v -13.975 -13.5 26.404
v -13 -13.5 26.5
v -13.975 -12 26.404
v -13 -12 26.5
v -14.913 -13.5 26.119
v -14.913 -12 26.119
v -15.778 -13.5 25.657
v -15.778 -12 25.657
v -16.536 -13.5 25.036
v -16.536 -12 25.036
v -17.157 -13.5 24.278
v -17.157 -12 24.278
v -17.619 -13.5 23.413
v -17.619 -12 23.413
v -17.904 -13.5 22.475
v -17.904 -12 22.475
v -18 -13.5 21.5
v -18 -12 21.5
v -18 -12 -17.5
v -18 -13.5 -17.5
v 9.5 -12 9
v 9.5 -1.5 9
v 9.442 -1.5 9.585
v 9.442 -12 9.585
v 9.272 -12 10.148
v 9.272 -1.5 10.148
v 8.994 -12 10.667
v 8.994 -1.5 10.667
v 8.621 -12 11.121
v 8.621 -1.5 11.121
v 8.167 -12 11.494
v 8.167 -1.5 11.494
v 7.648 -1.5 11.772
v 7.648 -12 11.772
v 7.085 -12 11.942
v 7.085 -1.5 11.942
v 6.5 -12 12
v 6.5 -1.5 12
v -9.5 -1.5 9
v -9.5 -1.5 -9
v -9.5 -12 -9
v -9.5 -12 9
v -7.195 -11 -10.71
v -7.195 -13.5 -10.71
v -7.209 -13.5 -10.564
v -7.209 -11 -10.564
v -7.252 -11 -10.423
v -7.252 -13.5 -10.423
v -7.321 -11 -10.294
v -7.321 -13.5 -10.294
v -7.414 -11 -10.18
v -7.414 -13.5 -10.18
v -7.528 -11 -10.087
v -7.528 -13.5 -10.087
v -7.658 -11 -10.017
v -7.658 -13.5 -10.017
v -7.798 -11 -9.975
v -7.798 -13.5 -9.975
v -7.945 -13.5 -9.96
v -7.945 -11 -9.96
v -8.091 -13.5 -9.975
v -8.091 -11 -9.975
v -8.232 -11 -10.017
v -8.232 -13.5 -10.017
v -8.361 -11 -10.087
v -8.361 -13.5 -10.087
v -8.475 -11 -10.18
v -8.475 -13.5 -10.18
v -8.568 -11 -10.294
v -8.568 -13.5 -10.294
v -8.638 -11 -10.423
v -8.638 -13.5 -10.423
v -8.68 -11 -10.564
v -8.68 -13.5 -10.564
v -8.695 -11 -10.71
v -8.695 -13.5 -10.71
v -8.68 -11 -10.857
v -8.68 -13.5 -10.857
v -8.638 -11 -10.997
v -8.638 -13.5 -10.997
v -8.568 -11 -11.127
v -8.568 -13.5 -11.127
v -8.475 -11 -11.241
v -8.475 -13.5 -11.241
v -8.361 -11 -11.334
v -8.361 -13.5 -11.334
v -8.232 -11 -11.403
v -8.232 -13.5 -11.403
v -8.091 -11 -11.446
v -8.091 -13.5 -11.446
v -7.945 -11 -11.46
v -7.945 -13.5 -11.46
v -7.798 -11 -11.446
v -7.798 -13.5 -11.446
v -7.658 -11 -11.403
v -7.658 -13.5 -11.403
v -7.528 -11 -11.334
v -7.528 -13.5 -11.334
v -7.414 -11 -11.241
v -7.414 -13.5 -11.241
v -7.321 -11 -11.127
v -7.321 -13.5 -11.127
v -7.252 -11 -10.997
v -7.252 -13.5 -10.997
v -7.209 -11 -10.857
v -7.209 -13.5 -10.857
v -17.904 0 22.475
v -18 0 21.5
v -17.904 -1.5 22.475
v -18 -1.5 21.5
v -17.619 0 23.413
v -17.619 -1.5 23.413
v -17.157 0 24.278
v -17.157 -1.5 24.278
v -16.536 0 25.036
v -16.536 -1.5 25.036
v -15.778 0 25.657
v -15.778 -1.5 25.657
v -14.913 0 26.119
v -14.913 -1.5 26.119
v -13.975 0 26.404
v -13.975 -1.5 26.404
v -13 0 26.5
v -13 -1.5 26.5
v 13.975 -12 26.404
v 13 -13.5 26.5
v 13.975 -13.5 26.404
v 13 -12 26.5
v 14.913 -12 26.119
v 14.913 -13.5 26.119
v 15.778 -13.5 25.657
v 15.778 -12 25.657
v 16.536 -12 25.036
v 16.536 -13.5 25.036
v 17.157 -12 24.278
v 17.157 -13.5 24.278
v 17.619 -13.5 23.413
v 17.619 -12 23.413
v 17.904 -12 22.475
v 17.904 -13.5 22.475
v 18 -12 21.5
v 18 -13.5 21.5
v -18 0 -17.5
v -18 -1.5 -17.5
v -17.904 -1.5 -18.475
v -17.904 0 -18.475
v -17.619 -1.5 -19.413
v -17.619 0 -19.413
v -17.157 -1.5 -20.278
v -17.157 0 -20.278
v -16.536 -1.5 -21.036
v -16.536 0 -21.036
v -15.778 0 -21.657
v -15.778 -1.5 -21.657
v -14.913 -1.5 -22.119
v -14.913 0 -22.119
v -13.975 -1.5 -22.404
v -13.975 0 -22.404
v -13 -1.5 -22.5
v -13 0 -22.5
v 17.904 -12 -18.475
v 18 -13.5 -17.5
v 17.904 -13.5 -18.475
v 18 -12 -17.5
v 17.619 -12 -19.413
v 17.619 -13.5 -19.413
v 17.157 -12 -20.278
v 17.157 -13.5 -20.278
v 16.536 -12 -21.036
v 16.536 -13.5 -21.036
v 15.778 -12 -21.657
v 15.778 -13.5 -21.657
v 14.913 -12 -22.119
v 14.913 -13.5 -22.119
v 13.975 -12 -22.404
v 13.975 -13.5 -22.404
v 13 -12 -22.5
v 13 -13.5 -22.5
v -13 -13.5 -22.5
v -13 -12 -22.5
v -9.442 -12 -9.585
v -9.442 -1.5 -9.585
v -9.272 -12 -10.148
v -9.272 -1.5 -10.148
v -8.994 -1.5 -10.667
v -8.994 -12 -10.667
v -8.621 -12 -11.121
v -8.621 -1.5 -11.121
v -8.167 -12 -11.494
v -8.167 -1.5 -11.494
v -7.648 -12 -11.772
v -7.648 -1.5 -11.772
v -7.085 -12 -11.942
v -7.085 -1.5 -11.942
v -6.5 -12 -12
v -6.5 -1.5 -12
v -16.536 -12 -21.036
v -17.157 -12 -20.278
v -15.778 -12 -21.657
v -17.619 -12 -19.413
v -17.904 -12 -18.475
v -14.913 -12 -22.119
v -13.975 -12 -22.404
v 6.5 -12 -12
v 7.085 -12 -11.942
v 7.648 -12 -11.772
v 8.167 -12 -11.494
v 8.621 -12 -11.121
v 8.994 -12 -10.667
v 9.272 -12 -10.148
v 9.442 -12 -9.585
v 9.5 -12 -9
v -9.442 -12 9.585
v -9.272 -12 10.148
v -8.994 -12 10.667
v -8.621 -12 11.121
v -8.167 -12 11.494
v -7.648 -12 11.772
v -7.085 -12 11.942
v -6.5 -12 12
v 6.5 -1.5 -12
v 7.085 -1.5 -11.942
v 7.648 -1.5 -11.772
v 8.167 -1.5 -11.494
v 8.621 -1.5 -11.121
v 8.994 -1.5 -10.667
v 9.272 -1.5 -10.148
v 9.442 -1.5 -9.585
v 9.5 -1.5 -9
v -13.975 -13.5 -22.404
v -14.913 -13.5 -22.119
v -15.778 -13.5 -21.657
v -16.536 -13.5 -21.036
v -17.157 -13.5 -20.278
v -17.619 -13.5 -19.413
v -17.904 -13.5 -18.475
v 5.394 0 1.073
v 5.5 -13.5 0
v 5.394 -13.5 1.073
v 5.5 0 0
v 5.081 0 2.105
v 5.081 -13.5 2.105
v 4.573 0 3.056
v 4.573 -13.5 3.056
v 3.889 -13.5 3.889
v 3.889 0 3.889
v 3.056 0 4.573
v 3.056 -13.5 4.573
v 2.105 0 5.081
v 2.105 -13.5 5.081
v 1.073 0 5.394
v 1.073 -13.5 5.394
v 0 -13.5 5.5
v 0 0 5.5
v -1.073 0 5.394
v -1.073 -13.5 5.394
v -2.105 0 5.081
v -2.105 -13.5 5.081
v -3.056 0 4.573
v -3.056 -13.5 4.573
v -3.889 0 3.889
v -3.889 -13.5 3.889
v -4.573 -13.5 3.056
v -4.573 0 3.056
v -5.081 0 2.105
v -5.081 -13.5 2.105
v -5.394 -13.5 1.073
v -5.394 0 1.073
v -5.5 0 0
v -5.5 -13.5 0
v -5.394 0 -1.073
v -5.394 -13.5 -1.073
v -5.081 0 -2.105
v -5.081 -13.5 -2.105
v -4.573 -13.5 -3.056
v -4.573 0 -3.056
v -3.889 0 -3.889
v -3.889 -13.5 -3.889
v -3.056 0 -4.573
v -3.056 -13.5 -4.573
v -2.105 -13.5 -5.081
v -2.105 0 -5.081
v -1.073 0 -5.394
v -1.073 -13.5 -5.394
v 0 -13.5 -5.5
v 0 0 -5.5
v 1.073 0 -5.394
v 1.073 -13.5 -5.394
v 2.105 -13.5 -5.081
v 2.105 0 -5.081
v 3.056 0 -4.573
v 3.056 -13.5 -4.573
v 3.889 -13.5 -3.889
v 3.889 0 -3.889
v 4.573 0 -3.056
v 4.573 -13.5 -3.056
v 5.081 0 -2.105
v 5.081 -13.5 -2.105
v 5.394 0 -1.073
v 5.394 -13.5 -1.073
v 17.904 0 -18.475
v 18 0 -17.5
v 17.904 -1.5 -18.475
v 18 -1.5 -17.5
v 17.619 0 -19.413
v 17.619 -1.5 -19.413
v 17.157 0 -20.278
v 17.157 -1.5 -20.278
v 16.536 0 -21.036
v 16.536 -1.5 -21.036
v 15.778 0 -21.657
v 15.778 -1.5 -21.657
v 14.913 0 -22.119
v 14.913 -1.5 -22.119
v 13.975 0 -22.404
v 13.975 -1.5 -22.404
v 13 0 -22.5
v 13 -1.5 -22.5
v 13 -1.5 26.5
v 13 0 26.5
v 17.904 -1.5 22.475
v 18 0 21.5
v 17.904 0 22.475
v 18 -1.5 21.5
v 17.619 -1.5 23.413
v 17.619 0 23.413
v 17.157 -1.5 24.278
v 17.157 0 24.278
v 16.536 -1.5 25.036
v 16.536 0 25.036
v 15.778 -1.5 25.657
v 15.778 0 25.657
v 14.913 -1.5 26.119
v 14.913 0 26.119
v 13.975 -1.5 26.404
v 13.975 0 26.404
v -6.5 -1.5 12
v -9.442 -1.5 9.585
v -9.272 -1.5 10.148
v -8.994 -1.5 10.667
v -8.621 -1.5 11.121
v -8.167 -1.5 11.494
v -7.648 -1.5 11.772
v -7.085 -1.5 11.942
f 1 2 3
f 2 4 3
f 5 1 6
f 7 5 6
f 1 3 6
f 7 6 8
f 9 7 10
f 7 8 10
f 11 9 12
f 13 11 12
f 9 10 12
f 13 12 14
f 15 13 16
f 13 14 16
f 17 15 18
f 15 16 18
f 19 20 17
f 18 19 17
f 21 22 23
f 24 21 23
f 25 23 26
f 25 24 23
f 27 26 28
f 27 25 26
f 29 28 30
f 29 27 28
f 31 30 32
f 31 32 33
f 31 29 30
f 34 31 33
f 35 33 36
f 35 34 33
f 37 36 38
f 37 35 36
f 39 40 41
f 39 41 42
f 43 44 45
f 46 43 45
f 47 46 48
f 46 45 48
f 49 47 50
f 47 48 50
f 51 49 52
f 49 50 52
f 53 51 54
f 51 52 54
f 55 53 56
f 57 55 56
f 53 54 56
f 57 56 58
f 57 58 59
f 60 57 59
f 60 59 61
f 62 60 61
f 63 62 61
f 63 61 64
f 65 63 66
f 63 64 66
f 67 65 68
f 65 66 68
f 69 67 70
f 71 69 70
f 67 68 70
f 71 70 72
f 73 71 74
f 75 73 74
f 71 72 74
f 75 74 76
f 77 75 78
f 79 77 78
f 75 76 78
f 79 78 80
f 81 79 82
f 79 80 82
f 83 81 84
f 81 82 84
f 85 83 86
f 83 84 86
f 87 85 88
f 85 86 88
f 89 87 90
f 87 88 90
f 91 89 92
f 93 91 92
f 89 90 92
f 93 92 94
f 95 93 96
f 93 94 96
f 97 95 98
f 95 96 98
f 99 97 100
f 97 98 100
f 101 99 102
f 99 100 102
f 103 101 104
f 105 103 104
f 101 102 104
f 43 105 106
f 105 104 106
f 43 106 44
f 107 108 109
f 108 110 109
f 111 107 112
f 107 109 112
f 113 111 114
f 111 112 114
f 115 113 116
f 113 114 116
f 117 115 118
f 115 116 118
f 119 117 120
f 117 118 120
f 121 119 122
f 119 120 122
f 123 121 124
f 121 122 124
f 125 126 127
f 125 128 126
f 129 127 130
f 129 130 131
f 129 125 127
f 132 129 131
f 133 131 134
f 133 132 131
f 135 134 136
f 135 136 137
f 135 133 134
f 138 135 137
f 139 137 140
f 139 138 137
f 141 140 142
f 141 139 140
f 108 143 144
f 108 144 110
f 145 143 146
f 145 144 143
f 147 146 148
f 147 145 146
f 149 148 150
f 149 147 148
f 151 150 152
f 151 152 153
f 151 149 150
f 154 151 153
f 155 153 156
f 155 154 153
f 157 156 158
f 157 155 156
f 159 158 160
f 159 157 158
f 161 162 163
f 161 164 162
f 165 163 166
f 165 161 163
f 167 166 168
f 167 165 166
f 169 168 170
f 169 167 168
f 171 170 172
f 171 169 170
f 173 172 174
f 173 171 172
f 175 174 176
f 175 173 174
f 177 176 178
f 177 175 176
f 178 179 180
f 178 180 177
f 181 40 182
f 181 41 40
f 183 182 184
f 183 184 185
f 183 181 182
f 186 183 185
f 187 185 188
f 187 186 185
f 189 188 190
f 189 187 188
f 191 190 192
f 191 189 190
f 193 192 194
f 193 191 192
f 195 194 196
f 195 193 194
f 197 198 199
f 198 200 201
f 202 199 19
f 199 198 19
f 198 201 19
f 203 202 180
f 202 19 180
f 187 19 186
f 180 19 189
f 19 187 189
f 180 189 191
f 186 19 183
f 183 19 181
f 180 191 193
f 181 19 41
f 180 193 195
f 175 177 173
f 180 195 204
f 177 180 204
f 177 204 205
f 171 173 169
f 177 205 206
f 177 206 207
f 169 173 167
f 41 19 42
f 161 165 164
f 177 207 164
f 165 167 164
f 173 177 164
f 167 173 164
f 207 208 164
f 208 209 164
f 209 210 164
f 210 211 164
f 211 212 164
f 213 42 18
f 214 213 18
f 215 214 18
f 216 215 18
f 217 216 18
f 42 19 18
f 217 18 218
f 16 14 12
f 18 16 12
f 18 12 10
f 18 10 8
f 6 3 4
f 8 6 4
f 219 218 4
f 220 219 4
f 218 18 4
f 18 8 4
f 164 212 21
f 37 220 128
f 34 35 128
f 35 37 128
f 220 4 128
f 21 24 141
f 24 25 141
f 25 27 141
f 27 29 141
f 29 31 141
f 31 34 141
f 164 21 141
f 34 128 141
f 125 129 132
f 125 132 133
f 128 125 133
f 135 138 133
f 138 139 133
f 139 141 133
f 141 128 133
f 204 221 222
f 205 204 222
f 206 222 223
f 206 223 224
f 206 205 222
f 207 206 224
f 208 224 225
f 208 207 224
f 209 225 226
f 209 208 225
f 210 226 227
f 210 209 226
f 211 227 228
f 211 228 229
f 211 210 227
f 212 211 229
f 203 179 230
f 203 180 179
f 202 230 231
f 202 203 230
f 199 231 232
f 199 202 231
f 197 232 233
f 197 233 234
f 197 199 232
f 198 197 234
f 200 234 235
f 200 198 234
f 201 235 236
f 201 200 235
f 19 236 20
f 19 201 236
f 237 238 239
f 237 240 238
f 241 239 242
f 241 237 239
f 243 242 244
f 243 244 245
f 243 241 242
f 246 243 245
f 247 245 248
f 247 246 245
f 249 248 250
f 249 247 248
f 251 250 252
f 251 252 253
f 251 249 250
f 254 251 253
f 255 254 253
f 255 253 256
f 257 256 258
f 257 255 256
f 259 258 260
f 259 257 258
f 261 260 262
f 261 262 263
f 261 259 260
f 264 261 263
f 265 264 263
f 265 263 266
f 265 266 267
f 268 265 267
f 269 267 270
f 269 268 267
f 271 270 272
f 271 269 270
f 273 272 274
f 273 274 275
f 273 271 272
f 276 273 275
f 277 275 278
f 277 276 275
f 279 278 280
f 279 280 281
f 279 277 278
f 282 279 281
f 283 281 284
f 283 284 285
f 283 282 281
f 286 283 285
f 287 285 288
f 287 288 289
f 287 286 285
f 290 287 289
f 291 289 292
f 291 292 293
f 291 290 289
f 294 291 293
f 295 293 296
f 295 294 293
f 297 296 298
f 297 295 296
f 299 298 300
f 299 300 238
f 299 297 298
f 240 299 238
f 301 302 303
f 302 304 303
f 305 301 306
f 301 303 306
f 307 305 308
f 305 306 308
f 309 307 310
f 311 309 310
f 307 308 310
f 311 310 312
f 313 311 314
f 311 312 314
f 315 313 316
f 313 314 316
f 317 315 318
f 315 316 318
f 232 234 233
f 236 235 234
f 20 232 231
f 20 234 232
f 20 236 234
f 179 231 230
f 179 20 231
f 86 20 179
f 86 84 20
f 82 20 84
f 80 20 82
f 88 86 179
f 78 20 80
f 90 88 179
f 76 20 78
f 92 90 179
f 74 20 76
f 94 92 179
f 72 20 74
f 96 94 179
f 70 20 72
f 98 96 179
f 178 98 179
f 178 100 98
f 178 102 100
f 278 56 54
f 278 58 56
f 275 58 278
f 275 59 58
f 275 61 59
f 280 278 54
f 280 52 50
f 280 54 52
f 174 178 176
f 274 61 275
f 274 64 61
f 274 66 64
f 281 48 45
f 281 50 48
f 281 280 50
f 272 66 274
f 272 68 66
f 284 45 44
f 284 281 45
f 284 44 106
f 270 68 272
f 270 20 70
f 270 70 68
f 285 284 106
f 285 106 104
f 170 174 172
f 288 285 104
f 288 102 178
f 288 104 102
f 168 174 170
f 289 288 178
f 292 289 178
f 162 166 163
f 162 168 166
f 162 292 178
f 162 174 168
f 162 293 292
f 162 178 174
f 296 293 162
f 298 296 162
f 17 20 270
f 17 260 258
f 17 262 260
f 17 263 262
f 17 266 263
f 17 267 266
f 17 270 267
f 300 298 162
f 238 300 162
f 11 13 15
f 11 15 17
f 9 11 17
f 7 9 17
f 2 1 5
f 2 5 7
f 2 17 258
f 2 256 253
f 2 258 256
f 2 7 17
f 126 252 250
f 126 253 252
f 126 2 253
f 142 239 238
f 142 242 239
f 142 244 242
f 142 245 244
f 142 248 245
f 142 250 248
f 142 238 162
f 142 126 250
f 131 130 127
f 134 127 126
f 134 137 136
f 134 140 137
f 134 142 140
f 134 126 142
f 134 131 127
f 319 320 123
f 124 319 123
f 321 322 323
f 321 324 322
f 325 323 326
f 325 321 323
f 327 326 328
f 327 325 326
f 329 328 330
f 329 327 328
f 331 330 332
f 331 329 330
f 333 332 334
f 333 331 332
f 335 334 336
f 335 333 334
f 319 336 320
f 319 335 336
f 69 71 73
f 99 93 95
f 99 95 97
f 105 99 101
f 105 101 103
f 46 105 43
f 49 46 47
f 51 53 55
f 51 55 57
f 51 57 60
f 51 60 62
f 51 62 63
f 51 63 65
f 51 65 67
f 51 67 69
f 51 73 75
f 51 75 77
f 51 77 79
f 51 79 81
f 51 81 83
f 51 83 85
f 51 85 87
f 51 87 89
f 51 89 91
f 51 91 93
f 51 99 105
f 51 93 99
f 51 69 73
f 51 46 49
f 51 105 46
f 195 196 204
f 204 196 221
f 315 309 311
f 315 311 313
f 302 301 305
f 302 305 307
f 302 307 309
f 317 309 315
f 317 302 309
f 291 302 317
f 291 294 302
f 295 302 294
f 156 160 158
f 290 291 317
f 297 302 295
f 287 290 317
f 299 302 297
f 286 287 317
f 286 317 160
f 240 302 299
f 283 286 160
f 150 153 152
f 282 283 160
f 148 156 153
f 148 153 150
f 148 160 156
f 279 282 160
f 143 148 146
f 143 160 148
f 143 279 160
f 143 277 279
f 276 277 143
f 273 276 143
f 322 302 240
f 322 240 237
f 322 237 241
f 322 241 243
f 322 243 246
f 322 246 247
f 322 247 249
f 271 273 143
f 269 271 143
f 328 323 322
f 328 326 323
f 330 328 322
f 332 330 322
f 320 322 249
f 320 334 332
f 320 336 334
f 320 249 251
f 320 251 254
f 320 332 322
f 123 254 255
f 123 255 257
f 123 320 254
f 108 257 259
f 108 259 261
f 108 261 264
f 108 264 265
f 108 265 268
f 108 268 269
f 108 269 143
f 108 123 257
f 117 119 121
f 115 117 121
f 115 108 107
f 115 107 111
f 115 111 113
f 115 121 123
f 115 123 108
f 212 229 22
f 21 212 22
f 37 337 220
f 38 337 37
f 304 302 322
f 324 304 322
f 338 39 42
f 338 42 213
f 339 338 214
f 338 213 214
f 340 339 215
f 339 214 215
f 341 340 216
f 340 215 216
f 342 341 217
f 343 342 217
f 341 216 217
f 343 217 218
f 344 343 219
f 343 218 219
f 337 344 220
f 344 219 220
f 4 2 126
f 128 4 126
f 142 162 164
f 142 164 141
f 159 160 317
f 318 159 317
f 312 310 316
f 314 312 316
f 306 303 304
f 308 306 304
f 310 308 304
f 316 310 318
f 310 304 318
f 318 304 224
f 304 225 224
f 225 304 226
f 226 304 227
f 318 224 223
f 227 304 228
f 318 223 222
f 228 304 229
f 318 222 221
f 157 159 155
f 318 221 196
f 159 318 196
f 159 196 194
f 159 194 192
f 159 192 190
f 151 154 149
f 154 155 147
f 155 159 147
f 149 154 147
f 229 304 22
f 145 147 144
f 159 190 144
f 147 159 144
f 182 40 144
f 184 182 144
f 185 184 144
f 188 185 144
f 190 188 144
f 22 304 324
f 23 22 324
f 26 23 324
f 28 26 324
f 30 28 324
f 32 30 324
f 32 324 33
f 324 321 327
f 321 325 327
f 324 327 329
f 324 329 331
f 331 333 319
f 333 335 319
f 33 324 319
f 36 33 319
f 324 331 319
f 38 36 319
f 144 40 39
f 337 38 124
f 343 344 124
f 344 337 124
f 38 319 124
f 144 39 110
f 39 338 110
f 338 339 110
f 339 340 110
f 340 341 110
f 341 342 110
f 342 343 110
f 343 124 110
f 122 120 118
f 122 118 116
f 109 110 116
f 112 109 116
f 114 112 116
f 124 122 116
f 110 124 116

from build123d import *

# Parameters (mm, degrees)
F0_W      = 36
F0_H      = 45
F0_R      = 5.5
F1_DEPTH  = 1.5
F2_W      = 19
F2_H      = 24
F2_R      = 5.5
F3_DEPTH  = 12
F4_W      = 36
F4_H      = 45
F4_W_2    = 19
F4_H_2    = 24
F4_R      = 5.5
F5_DEPTH  = 1.5
F6_R      = 0.75
F7_DEPTH  = 2.5
F8_W      = 36
F8_H      = 4
F9_DEPTH  = 1.5
F10_W     = 36
F10_H     = 4
F11_DEPTH = 1.5
F12_R     = 5
F13_R     = 3


with BuildPart() as f1:
    # F0 (on Front) → F1 (new body)
    with BuildSketch(Plane.XZ):
        Rectangle(F0_W, F0_H)
        Circle(F0_R, mode=Mode.SUBTRACT)
    extrude(amount=F1_DEPTH)

    # F2 (on face) → F3 (join)
    with BuildSketch(Plane.XZ.offset(1.5)):
        Rectangle(F2_W, F2_H)
        Circle(F2_R, mode=Mode.SUBTRACT)
    extrude(amount=F3_DEPTH)

    # F4 (on face) → F5 (join)
    with BuildSketch(Plane.XZ.offset(13.5)):
        Rectangle(F4_W, F4_H)
        Rectangle(F4_W_2, F4_H_2, mode=Mode.SUBTRACT)
        Rectangle(F4_W_2, F4_H_2)
        Circle(F4_R, mode=Mode.SUBTRACT)
    extrude(amount=-F5_DEPTH)

    # F6 (on face) → F7 (cut)
    with BuildSketch(Plane.XZ.offset(13.5)):
        with Locations((-7.9445969313, -10.7102040201)):
            Circle(F6_R)
    extrude(amount=-F7_DEPTH, mode=Mode.SUBTRACT)

    # F8 (on face) → F9 (join)
    with BuildSketch(Plane.XZ.offset(13.5)):
        with Locations((0, 24.5)):
            Rectangle(F8_W, F8_H)
    extrude(amount=-F9_DEPTH)

    # F10 (on face) → F11 (join)
    with BuildSketch(Plane(origin=(0, 0, 0), x_dir=(-1, 0, 0), z_dir=(0, 1, 0))):
        with Locations((0, 24.5)):
            Rectangle(F10_W, F10_H)
    extrude(amount=-F11_DEPTH)

    # F12
    f12_edges = [f1.edges().sort_by_distance(p)[0] for p in [
        (18, -12.75, 26.5),
        (18, -0.75, 26.5),
        (18, -0.75, -22.5),
        (18, -12.75, -22.5),
        (-18, -0.75, -22.5),
        (-18, -12.75, -22.5),
        (-18, -0.75, 26.5),
        (-18, -12.75, 26.5),
    ]]
    fillet(f12_edges, radius=F12_R)

    # F13
    f13_edges = [f1.edges().sort_by_distance(p)[0] for p in [
        (-9.5, -6.75, 12),
        (9.5, -6.75, 12),
        (9.5, -6.75, -12),
        (-9.5, -6.75, -12),
    ]]
    fillet(f13_edges, radius=F13_R)


solid = f1.part
